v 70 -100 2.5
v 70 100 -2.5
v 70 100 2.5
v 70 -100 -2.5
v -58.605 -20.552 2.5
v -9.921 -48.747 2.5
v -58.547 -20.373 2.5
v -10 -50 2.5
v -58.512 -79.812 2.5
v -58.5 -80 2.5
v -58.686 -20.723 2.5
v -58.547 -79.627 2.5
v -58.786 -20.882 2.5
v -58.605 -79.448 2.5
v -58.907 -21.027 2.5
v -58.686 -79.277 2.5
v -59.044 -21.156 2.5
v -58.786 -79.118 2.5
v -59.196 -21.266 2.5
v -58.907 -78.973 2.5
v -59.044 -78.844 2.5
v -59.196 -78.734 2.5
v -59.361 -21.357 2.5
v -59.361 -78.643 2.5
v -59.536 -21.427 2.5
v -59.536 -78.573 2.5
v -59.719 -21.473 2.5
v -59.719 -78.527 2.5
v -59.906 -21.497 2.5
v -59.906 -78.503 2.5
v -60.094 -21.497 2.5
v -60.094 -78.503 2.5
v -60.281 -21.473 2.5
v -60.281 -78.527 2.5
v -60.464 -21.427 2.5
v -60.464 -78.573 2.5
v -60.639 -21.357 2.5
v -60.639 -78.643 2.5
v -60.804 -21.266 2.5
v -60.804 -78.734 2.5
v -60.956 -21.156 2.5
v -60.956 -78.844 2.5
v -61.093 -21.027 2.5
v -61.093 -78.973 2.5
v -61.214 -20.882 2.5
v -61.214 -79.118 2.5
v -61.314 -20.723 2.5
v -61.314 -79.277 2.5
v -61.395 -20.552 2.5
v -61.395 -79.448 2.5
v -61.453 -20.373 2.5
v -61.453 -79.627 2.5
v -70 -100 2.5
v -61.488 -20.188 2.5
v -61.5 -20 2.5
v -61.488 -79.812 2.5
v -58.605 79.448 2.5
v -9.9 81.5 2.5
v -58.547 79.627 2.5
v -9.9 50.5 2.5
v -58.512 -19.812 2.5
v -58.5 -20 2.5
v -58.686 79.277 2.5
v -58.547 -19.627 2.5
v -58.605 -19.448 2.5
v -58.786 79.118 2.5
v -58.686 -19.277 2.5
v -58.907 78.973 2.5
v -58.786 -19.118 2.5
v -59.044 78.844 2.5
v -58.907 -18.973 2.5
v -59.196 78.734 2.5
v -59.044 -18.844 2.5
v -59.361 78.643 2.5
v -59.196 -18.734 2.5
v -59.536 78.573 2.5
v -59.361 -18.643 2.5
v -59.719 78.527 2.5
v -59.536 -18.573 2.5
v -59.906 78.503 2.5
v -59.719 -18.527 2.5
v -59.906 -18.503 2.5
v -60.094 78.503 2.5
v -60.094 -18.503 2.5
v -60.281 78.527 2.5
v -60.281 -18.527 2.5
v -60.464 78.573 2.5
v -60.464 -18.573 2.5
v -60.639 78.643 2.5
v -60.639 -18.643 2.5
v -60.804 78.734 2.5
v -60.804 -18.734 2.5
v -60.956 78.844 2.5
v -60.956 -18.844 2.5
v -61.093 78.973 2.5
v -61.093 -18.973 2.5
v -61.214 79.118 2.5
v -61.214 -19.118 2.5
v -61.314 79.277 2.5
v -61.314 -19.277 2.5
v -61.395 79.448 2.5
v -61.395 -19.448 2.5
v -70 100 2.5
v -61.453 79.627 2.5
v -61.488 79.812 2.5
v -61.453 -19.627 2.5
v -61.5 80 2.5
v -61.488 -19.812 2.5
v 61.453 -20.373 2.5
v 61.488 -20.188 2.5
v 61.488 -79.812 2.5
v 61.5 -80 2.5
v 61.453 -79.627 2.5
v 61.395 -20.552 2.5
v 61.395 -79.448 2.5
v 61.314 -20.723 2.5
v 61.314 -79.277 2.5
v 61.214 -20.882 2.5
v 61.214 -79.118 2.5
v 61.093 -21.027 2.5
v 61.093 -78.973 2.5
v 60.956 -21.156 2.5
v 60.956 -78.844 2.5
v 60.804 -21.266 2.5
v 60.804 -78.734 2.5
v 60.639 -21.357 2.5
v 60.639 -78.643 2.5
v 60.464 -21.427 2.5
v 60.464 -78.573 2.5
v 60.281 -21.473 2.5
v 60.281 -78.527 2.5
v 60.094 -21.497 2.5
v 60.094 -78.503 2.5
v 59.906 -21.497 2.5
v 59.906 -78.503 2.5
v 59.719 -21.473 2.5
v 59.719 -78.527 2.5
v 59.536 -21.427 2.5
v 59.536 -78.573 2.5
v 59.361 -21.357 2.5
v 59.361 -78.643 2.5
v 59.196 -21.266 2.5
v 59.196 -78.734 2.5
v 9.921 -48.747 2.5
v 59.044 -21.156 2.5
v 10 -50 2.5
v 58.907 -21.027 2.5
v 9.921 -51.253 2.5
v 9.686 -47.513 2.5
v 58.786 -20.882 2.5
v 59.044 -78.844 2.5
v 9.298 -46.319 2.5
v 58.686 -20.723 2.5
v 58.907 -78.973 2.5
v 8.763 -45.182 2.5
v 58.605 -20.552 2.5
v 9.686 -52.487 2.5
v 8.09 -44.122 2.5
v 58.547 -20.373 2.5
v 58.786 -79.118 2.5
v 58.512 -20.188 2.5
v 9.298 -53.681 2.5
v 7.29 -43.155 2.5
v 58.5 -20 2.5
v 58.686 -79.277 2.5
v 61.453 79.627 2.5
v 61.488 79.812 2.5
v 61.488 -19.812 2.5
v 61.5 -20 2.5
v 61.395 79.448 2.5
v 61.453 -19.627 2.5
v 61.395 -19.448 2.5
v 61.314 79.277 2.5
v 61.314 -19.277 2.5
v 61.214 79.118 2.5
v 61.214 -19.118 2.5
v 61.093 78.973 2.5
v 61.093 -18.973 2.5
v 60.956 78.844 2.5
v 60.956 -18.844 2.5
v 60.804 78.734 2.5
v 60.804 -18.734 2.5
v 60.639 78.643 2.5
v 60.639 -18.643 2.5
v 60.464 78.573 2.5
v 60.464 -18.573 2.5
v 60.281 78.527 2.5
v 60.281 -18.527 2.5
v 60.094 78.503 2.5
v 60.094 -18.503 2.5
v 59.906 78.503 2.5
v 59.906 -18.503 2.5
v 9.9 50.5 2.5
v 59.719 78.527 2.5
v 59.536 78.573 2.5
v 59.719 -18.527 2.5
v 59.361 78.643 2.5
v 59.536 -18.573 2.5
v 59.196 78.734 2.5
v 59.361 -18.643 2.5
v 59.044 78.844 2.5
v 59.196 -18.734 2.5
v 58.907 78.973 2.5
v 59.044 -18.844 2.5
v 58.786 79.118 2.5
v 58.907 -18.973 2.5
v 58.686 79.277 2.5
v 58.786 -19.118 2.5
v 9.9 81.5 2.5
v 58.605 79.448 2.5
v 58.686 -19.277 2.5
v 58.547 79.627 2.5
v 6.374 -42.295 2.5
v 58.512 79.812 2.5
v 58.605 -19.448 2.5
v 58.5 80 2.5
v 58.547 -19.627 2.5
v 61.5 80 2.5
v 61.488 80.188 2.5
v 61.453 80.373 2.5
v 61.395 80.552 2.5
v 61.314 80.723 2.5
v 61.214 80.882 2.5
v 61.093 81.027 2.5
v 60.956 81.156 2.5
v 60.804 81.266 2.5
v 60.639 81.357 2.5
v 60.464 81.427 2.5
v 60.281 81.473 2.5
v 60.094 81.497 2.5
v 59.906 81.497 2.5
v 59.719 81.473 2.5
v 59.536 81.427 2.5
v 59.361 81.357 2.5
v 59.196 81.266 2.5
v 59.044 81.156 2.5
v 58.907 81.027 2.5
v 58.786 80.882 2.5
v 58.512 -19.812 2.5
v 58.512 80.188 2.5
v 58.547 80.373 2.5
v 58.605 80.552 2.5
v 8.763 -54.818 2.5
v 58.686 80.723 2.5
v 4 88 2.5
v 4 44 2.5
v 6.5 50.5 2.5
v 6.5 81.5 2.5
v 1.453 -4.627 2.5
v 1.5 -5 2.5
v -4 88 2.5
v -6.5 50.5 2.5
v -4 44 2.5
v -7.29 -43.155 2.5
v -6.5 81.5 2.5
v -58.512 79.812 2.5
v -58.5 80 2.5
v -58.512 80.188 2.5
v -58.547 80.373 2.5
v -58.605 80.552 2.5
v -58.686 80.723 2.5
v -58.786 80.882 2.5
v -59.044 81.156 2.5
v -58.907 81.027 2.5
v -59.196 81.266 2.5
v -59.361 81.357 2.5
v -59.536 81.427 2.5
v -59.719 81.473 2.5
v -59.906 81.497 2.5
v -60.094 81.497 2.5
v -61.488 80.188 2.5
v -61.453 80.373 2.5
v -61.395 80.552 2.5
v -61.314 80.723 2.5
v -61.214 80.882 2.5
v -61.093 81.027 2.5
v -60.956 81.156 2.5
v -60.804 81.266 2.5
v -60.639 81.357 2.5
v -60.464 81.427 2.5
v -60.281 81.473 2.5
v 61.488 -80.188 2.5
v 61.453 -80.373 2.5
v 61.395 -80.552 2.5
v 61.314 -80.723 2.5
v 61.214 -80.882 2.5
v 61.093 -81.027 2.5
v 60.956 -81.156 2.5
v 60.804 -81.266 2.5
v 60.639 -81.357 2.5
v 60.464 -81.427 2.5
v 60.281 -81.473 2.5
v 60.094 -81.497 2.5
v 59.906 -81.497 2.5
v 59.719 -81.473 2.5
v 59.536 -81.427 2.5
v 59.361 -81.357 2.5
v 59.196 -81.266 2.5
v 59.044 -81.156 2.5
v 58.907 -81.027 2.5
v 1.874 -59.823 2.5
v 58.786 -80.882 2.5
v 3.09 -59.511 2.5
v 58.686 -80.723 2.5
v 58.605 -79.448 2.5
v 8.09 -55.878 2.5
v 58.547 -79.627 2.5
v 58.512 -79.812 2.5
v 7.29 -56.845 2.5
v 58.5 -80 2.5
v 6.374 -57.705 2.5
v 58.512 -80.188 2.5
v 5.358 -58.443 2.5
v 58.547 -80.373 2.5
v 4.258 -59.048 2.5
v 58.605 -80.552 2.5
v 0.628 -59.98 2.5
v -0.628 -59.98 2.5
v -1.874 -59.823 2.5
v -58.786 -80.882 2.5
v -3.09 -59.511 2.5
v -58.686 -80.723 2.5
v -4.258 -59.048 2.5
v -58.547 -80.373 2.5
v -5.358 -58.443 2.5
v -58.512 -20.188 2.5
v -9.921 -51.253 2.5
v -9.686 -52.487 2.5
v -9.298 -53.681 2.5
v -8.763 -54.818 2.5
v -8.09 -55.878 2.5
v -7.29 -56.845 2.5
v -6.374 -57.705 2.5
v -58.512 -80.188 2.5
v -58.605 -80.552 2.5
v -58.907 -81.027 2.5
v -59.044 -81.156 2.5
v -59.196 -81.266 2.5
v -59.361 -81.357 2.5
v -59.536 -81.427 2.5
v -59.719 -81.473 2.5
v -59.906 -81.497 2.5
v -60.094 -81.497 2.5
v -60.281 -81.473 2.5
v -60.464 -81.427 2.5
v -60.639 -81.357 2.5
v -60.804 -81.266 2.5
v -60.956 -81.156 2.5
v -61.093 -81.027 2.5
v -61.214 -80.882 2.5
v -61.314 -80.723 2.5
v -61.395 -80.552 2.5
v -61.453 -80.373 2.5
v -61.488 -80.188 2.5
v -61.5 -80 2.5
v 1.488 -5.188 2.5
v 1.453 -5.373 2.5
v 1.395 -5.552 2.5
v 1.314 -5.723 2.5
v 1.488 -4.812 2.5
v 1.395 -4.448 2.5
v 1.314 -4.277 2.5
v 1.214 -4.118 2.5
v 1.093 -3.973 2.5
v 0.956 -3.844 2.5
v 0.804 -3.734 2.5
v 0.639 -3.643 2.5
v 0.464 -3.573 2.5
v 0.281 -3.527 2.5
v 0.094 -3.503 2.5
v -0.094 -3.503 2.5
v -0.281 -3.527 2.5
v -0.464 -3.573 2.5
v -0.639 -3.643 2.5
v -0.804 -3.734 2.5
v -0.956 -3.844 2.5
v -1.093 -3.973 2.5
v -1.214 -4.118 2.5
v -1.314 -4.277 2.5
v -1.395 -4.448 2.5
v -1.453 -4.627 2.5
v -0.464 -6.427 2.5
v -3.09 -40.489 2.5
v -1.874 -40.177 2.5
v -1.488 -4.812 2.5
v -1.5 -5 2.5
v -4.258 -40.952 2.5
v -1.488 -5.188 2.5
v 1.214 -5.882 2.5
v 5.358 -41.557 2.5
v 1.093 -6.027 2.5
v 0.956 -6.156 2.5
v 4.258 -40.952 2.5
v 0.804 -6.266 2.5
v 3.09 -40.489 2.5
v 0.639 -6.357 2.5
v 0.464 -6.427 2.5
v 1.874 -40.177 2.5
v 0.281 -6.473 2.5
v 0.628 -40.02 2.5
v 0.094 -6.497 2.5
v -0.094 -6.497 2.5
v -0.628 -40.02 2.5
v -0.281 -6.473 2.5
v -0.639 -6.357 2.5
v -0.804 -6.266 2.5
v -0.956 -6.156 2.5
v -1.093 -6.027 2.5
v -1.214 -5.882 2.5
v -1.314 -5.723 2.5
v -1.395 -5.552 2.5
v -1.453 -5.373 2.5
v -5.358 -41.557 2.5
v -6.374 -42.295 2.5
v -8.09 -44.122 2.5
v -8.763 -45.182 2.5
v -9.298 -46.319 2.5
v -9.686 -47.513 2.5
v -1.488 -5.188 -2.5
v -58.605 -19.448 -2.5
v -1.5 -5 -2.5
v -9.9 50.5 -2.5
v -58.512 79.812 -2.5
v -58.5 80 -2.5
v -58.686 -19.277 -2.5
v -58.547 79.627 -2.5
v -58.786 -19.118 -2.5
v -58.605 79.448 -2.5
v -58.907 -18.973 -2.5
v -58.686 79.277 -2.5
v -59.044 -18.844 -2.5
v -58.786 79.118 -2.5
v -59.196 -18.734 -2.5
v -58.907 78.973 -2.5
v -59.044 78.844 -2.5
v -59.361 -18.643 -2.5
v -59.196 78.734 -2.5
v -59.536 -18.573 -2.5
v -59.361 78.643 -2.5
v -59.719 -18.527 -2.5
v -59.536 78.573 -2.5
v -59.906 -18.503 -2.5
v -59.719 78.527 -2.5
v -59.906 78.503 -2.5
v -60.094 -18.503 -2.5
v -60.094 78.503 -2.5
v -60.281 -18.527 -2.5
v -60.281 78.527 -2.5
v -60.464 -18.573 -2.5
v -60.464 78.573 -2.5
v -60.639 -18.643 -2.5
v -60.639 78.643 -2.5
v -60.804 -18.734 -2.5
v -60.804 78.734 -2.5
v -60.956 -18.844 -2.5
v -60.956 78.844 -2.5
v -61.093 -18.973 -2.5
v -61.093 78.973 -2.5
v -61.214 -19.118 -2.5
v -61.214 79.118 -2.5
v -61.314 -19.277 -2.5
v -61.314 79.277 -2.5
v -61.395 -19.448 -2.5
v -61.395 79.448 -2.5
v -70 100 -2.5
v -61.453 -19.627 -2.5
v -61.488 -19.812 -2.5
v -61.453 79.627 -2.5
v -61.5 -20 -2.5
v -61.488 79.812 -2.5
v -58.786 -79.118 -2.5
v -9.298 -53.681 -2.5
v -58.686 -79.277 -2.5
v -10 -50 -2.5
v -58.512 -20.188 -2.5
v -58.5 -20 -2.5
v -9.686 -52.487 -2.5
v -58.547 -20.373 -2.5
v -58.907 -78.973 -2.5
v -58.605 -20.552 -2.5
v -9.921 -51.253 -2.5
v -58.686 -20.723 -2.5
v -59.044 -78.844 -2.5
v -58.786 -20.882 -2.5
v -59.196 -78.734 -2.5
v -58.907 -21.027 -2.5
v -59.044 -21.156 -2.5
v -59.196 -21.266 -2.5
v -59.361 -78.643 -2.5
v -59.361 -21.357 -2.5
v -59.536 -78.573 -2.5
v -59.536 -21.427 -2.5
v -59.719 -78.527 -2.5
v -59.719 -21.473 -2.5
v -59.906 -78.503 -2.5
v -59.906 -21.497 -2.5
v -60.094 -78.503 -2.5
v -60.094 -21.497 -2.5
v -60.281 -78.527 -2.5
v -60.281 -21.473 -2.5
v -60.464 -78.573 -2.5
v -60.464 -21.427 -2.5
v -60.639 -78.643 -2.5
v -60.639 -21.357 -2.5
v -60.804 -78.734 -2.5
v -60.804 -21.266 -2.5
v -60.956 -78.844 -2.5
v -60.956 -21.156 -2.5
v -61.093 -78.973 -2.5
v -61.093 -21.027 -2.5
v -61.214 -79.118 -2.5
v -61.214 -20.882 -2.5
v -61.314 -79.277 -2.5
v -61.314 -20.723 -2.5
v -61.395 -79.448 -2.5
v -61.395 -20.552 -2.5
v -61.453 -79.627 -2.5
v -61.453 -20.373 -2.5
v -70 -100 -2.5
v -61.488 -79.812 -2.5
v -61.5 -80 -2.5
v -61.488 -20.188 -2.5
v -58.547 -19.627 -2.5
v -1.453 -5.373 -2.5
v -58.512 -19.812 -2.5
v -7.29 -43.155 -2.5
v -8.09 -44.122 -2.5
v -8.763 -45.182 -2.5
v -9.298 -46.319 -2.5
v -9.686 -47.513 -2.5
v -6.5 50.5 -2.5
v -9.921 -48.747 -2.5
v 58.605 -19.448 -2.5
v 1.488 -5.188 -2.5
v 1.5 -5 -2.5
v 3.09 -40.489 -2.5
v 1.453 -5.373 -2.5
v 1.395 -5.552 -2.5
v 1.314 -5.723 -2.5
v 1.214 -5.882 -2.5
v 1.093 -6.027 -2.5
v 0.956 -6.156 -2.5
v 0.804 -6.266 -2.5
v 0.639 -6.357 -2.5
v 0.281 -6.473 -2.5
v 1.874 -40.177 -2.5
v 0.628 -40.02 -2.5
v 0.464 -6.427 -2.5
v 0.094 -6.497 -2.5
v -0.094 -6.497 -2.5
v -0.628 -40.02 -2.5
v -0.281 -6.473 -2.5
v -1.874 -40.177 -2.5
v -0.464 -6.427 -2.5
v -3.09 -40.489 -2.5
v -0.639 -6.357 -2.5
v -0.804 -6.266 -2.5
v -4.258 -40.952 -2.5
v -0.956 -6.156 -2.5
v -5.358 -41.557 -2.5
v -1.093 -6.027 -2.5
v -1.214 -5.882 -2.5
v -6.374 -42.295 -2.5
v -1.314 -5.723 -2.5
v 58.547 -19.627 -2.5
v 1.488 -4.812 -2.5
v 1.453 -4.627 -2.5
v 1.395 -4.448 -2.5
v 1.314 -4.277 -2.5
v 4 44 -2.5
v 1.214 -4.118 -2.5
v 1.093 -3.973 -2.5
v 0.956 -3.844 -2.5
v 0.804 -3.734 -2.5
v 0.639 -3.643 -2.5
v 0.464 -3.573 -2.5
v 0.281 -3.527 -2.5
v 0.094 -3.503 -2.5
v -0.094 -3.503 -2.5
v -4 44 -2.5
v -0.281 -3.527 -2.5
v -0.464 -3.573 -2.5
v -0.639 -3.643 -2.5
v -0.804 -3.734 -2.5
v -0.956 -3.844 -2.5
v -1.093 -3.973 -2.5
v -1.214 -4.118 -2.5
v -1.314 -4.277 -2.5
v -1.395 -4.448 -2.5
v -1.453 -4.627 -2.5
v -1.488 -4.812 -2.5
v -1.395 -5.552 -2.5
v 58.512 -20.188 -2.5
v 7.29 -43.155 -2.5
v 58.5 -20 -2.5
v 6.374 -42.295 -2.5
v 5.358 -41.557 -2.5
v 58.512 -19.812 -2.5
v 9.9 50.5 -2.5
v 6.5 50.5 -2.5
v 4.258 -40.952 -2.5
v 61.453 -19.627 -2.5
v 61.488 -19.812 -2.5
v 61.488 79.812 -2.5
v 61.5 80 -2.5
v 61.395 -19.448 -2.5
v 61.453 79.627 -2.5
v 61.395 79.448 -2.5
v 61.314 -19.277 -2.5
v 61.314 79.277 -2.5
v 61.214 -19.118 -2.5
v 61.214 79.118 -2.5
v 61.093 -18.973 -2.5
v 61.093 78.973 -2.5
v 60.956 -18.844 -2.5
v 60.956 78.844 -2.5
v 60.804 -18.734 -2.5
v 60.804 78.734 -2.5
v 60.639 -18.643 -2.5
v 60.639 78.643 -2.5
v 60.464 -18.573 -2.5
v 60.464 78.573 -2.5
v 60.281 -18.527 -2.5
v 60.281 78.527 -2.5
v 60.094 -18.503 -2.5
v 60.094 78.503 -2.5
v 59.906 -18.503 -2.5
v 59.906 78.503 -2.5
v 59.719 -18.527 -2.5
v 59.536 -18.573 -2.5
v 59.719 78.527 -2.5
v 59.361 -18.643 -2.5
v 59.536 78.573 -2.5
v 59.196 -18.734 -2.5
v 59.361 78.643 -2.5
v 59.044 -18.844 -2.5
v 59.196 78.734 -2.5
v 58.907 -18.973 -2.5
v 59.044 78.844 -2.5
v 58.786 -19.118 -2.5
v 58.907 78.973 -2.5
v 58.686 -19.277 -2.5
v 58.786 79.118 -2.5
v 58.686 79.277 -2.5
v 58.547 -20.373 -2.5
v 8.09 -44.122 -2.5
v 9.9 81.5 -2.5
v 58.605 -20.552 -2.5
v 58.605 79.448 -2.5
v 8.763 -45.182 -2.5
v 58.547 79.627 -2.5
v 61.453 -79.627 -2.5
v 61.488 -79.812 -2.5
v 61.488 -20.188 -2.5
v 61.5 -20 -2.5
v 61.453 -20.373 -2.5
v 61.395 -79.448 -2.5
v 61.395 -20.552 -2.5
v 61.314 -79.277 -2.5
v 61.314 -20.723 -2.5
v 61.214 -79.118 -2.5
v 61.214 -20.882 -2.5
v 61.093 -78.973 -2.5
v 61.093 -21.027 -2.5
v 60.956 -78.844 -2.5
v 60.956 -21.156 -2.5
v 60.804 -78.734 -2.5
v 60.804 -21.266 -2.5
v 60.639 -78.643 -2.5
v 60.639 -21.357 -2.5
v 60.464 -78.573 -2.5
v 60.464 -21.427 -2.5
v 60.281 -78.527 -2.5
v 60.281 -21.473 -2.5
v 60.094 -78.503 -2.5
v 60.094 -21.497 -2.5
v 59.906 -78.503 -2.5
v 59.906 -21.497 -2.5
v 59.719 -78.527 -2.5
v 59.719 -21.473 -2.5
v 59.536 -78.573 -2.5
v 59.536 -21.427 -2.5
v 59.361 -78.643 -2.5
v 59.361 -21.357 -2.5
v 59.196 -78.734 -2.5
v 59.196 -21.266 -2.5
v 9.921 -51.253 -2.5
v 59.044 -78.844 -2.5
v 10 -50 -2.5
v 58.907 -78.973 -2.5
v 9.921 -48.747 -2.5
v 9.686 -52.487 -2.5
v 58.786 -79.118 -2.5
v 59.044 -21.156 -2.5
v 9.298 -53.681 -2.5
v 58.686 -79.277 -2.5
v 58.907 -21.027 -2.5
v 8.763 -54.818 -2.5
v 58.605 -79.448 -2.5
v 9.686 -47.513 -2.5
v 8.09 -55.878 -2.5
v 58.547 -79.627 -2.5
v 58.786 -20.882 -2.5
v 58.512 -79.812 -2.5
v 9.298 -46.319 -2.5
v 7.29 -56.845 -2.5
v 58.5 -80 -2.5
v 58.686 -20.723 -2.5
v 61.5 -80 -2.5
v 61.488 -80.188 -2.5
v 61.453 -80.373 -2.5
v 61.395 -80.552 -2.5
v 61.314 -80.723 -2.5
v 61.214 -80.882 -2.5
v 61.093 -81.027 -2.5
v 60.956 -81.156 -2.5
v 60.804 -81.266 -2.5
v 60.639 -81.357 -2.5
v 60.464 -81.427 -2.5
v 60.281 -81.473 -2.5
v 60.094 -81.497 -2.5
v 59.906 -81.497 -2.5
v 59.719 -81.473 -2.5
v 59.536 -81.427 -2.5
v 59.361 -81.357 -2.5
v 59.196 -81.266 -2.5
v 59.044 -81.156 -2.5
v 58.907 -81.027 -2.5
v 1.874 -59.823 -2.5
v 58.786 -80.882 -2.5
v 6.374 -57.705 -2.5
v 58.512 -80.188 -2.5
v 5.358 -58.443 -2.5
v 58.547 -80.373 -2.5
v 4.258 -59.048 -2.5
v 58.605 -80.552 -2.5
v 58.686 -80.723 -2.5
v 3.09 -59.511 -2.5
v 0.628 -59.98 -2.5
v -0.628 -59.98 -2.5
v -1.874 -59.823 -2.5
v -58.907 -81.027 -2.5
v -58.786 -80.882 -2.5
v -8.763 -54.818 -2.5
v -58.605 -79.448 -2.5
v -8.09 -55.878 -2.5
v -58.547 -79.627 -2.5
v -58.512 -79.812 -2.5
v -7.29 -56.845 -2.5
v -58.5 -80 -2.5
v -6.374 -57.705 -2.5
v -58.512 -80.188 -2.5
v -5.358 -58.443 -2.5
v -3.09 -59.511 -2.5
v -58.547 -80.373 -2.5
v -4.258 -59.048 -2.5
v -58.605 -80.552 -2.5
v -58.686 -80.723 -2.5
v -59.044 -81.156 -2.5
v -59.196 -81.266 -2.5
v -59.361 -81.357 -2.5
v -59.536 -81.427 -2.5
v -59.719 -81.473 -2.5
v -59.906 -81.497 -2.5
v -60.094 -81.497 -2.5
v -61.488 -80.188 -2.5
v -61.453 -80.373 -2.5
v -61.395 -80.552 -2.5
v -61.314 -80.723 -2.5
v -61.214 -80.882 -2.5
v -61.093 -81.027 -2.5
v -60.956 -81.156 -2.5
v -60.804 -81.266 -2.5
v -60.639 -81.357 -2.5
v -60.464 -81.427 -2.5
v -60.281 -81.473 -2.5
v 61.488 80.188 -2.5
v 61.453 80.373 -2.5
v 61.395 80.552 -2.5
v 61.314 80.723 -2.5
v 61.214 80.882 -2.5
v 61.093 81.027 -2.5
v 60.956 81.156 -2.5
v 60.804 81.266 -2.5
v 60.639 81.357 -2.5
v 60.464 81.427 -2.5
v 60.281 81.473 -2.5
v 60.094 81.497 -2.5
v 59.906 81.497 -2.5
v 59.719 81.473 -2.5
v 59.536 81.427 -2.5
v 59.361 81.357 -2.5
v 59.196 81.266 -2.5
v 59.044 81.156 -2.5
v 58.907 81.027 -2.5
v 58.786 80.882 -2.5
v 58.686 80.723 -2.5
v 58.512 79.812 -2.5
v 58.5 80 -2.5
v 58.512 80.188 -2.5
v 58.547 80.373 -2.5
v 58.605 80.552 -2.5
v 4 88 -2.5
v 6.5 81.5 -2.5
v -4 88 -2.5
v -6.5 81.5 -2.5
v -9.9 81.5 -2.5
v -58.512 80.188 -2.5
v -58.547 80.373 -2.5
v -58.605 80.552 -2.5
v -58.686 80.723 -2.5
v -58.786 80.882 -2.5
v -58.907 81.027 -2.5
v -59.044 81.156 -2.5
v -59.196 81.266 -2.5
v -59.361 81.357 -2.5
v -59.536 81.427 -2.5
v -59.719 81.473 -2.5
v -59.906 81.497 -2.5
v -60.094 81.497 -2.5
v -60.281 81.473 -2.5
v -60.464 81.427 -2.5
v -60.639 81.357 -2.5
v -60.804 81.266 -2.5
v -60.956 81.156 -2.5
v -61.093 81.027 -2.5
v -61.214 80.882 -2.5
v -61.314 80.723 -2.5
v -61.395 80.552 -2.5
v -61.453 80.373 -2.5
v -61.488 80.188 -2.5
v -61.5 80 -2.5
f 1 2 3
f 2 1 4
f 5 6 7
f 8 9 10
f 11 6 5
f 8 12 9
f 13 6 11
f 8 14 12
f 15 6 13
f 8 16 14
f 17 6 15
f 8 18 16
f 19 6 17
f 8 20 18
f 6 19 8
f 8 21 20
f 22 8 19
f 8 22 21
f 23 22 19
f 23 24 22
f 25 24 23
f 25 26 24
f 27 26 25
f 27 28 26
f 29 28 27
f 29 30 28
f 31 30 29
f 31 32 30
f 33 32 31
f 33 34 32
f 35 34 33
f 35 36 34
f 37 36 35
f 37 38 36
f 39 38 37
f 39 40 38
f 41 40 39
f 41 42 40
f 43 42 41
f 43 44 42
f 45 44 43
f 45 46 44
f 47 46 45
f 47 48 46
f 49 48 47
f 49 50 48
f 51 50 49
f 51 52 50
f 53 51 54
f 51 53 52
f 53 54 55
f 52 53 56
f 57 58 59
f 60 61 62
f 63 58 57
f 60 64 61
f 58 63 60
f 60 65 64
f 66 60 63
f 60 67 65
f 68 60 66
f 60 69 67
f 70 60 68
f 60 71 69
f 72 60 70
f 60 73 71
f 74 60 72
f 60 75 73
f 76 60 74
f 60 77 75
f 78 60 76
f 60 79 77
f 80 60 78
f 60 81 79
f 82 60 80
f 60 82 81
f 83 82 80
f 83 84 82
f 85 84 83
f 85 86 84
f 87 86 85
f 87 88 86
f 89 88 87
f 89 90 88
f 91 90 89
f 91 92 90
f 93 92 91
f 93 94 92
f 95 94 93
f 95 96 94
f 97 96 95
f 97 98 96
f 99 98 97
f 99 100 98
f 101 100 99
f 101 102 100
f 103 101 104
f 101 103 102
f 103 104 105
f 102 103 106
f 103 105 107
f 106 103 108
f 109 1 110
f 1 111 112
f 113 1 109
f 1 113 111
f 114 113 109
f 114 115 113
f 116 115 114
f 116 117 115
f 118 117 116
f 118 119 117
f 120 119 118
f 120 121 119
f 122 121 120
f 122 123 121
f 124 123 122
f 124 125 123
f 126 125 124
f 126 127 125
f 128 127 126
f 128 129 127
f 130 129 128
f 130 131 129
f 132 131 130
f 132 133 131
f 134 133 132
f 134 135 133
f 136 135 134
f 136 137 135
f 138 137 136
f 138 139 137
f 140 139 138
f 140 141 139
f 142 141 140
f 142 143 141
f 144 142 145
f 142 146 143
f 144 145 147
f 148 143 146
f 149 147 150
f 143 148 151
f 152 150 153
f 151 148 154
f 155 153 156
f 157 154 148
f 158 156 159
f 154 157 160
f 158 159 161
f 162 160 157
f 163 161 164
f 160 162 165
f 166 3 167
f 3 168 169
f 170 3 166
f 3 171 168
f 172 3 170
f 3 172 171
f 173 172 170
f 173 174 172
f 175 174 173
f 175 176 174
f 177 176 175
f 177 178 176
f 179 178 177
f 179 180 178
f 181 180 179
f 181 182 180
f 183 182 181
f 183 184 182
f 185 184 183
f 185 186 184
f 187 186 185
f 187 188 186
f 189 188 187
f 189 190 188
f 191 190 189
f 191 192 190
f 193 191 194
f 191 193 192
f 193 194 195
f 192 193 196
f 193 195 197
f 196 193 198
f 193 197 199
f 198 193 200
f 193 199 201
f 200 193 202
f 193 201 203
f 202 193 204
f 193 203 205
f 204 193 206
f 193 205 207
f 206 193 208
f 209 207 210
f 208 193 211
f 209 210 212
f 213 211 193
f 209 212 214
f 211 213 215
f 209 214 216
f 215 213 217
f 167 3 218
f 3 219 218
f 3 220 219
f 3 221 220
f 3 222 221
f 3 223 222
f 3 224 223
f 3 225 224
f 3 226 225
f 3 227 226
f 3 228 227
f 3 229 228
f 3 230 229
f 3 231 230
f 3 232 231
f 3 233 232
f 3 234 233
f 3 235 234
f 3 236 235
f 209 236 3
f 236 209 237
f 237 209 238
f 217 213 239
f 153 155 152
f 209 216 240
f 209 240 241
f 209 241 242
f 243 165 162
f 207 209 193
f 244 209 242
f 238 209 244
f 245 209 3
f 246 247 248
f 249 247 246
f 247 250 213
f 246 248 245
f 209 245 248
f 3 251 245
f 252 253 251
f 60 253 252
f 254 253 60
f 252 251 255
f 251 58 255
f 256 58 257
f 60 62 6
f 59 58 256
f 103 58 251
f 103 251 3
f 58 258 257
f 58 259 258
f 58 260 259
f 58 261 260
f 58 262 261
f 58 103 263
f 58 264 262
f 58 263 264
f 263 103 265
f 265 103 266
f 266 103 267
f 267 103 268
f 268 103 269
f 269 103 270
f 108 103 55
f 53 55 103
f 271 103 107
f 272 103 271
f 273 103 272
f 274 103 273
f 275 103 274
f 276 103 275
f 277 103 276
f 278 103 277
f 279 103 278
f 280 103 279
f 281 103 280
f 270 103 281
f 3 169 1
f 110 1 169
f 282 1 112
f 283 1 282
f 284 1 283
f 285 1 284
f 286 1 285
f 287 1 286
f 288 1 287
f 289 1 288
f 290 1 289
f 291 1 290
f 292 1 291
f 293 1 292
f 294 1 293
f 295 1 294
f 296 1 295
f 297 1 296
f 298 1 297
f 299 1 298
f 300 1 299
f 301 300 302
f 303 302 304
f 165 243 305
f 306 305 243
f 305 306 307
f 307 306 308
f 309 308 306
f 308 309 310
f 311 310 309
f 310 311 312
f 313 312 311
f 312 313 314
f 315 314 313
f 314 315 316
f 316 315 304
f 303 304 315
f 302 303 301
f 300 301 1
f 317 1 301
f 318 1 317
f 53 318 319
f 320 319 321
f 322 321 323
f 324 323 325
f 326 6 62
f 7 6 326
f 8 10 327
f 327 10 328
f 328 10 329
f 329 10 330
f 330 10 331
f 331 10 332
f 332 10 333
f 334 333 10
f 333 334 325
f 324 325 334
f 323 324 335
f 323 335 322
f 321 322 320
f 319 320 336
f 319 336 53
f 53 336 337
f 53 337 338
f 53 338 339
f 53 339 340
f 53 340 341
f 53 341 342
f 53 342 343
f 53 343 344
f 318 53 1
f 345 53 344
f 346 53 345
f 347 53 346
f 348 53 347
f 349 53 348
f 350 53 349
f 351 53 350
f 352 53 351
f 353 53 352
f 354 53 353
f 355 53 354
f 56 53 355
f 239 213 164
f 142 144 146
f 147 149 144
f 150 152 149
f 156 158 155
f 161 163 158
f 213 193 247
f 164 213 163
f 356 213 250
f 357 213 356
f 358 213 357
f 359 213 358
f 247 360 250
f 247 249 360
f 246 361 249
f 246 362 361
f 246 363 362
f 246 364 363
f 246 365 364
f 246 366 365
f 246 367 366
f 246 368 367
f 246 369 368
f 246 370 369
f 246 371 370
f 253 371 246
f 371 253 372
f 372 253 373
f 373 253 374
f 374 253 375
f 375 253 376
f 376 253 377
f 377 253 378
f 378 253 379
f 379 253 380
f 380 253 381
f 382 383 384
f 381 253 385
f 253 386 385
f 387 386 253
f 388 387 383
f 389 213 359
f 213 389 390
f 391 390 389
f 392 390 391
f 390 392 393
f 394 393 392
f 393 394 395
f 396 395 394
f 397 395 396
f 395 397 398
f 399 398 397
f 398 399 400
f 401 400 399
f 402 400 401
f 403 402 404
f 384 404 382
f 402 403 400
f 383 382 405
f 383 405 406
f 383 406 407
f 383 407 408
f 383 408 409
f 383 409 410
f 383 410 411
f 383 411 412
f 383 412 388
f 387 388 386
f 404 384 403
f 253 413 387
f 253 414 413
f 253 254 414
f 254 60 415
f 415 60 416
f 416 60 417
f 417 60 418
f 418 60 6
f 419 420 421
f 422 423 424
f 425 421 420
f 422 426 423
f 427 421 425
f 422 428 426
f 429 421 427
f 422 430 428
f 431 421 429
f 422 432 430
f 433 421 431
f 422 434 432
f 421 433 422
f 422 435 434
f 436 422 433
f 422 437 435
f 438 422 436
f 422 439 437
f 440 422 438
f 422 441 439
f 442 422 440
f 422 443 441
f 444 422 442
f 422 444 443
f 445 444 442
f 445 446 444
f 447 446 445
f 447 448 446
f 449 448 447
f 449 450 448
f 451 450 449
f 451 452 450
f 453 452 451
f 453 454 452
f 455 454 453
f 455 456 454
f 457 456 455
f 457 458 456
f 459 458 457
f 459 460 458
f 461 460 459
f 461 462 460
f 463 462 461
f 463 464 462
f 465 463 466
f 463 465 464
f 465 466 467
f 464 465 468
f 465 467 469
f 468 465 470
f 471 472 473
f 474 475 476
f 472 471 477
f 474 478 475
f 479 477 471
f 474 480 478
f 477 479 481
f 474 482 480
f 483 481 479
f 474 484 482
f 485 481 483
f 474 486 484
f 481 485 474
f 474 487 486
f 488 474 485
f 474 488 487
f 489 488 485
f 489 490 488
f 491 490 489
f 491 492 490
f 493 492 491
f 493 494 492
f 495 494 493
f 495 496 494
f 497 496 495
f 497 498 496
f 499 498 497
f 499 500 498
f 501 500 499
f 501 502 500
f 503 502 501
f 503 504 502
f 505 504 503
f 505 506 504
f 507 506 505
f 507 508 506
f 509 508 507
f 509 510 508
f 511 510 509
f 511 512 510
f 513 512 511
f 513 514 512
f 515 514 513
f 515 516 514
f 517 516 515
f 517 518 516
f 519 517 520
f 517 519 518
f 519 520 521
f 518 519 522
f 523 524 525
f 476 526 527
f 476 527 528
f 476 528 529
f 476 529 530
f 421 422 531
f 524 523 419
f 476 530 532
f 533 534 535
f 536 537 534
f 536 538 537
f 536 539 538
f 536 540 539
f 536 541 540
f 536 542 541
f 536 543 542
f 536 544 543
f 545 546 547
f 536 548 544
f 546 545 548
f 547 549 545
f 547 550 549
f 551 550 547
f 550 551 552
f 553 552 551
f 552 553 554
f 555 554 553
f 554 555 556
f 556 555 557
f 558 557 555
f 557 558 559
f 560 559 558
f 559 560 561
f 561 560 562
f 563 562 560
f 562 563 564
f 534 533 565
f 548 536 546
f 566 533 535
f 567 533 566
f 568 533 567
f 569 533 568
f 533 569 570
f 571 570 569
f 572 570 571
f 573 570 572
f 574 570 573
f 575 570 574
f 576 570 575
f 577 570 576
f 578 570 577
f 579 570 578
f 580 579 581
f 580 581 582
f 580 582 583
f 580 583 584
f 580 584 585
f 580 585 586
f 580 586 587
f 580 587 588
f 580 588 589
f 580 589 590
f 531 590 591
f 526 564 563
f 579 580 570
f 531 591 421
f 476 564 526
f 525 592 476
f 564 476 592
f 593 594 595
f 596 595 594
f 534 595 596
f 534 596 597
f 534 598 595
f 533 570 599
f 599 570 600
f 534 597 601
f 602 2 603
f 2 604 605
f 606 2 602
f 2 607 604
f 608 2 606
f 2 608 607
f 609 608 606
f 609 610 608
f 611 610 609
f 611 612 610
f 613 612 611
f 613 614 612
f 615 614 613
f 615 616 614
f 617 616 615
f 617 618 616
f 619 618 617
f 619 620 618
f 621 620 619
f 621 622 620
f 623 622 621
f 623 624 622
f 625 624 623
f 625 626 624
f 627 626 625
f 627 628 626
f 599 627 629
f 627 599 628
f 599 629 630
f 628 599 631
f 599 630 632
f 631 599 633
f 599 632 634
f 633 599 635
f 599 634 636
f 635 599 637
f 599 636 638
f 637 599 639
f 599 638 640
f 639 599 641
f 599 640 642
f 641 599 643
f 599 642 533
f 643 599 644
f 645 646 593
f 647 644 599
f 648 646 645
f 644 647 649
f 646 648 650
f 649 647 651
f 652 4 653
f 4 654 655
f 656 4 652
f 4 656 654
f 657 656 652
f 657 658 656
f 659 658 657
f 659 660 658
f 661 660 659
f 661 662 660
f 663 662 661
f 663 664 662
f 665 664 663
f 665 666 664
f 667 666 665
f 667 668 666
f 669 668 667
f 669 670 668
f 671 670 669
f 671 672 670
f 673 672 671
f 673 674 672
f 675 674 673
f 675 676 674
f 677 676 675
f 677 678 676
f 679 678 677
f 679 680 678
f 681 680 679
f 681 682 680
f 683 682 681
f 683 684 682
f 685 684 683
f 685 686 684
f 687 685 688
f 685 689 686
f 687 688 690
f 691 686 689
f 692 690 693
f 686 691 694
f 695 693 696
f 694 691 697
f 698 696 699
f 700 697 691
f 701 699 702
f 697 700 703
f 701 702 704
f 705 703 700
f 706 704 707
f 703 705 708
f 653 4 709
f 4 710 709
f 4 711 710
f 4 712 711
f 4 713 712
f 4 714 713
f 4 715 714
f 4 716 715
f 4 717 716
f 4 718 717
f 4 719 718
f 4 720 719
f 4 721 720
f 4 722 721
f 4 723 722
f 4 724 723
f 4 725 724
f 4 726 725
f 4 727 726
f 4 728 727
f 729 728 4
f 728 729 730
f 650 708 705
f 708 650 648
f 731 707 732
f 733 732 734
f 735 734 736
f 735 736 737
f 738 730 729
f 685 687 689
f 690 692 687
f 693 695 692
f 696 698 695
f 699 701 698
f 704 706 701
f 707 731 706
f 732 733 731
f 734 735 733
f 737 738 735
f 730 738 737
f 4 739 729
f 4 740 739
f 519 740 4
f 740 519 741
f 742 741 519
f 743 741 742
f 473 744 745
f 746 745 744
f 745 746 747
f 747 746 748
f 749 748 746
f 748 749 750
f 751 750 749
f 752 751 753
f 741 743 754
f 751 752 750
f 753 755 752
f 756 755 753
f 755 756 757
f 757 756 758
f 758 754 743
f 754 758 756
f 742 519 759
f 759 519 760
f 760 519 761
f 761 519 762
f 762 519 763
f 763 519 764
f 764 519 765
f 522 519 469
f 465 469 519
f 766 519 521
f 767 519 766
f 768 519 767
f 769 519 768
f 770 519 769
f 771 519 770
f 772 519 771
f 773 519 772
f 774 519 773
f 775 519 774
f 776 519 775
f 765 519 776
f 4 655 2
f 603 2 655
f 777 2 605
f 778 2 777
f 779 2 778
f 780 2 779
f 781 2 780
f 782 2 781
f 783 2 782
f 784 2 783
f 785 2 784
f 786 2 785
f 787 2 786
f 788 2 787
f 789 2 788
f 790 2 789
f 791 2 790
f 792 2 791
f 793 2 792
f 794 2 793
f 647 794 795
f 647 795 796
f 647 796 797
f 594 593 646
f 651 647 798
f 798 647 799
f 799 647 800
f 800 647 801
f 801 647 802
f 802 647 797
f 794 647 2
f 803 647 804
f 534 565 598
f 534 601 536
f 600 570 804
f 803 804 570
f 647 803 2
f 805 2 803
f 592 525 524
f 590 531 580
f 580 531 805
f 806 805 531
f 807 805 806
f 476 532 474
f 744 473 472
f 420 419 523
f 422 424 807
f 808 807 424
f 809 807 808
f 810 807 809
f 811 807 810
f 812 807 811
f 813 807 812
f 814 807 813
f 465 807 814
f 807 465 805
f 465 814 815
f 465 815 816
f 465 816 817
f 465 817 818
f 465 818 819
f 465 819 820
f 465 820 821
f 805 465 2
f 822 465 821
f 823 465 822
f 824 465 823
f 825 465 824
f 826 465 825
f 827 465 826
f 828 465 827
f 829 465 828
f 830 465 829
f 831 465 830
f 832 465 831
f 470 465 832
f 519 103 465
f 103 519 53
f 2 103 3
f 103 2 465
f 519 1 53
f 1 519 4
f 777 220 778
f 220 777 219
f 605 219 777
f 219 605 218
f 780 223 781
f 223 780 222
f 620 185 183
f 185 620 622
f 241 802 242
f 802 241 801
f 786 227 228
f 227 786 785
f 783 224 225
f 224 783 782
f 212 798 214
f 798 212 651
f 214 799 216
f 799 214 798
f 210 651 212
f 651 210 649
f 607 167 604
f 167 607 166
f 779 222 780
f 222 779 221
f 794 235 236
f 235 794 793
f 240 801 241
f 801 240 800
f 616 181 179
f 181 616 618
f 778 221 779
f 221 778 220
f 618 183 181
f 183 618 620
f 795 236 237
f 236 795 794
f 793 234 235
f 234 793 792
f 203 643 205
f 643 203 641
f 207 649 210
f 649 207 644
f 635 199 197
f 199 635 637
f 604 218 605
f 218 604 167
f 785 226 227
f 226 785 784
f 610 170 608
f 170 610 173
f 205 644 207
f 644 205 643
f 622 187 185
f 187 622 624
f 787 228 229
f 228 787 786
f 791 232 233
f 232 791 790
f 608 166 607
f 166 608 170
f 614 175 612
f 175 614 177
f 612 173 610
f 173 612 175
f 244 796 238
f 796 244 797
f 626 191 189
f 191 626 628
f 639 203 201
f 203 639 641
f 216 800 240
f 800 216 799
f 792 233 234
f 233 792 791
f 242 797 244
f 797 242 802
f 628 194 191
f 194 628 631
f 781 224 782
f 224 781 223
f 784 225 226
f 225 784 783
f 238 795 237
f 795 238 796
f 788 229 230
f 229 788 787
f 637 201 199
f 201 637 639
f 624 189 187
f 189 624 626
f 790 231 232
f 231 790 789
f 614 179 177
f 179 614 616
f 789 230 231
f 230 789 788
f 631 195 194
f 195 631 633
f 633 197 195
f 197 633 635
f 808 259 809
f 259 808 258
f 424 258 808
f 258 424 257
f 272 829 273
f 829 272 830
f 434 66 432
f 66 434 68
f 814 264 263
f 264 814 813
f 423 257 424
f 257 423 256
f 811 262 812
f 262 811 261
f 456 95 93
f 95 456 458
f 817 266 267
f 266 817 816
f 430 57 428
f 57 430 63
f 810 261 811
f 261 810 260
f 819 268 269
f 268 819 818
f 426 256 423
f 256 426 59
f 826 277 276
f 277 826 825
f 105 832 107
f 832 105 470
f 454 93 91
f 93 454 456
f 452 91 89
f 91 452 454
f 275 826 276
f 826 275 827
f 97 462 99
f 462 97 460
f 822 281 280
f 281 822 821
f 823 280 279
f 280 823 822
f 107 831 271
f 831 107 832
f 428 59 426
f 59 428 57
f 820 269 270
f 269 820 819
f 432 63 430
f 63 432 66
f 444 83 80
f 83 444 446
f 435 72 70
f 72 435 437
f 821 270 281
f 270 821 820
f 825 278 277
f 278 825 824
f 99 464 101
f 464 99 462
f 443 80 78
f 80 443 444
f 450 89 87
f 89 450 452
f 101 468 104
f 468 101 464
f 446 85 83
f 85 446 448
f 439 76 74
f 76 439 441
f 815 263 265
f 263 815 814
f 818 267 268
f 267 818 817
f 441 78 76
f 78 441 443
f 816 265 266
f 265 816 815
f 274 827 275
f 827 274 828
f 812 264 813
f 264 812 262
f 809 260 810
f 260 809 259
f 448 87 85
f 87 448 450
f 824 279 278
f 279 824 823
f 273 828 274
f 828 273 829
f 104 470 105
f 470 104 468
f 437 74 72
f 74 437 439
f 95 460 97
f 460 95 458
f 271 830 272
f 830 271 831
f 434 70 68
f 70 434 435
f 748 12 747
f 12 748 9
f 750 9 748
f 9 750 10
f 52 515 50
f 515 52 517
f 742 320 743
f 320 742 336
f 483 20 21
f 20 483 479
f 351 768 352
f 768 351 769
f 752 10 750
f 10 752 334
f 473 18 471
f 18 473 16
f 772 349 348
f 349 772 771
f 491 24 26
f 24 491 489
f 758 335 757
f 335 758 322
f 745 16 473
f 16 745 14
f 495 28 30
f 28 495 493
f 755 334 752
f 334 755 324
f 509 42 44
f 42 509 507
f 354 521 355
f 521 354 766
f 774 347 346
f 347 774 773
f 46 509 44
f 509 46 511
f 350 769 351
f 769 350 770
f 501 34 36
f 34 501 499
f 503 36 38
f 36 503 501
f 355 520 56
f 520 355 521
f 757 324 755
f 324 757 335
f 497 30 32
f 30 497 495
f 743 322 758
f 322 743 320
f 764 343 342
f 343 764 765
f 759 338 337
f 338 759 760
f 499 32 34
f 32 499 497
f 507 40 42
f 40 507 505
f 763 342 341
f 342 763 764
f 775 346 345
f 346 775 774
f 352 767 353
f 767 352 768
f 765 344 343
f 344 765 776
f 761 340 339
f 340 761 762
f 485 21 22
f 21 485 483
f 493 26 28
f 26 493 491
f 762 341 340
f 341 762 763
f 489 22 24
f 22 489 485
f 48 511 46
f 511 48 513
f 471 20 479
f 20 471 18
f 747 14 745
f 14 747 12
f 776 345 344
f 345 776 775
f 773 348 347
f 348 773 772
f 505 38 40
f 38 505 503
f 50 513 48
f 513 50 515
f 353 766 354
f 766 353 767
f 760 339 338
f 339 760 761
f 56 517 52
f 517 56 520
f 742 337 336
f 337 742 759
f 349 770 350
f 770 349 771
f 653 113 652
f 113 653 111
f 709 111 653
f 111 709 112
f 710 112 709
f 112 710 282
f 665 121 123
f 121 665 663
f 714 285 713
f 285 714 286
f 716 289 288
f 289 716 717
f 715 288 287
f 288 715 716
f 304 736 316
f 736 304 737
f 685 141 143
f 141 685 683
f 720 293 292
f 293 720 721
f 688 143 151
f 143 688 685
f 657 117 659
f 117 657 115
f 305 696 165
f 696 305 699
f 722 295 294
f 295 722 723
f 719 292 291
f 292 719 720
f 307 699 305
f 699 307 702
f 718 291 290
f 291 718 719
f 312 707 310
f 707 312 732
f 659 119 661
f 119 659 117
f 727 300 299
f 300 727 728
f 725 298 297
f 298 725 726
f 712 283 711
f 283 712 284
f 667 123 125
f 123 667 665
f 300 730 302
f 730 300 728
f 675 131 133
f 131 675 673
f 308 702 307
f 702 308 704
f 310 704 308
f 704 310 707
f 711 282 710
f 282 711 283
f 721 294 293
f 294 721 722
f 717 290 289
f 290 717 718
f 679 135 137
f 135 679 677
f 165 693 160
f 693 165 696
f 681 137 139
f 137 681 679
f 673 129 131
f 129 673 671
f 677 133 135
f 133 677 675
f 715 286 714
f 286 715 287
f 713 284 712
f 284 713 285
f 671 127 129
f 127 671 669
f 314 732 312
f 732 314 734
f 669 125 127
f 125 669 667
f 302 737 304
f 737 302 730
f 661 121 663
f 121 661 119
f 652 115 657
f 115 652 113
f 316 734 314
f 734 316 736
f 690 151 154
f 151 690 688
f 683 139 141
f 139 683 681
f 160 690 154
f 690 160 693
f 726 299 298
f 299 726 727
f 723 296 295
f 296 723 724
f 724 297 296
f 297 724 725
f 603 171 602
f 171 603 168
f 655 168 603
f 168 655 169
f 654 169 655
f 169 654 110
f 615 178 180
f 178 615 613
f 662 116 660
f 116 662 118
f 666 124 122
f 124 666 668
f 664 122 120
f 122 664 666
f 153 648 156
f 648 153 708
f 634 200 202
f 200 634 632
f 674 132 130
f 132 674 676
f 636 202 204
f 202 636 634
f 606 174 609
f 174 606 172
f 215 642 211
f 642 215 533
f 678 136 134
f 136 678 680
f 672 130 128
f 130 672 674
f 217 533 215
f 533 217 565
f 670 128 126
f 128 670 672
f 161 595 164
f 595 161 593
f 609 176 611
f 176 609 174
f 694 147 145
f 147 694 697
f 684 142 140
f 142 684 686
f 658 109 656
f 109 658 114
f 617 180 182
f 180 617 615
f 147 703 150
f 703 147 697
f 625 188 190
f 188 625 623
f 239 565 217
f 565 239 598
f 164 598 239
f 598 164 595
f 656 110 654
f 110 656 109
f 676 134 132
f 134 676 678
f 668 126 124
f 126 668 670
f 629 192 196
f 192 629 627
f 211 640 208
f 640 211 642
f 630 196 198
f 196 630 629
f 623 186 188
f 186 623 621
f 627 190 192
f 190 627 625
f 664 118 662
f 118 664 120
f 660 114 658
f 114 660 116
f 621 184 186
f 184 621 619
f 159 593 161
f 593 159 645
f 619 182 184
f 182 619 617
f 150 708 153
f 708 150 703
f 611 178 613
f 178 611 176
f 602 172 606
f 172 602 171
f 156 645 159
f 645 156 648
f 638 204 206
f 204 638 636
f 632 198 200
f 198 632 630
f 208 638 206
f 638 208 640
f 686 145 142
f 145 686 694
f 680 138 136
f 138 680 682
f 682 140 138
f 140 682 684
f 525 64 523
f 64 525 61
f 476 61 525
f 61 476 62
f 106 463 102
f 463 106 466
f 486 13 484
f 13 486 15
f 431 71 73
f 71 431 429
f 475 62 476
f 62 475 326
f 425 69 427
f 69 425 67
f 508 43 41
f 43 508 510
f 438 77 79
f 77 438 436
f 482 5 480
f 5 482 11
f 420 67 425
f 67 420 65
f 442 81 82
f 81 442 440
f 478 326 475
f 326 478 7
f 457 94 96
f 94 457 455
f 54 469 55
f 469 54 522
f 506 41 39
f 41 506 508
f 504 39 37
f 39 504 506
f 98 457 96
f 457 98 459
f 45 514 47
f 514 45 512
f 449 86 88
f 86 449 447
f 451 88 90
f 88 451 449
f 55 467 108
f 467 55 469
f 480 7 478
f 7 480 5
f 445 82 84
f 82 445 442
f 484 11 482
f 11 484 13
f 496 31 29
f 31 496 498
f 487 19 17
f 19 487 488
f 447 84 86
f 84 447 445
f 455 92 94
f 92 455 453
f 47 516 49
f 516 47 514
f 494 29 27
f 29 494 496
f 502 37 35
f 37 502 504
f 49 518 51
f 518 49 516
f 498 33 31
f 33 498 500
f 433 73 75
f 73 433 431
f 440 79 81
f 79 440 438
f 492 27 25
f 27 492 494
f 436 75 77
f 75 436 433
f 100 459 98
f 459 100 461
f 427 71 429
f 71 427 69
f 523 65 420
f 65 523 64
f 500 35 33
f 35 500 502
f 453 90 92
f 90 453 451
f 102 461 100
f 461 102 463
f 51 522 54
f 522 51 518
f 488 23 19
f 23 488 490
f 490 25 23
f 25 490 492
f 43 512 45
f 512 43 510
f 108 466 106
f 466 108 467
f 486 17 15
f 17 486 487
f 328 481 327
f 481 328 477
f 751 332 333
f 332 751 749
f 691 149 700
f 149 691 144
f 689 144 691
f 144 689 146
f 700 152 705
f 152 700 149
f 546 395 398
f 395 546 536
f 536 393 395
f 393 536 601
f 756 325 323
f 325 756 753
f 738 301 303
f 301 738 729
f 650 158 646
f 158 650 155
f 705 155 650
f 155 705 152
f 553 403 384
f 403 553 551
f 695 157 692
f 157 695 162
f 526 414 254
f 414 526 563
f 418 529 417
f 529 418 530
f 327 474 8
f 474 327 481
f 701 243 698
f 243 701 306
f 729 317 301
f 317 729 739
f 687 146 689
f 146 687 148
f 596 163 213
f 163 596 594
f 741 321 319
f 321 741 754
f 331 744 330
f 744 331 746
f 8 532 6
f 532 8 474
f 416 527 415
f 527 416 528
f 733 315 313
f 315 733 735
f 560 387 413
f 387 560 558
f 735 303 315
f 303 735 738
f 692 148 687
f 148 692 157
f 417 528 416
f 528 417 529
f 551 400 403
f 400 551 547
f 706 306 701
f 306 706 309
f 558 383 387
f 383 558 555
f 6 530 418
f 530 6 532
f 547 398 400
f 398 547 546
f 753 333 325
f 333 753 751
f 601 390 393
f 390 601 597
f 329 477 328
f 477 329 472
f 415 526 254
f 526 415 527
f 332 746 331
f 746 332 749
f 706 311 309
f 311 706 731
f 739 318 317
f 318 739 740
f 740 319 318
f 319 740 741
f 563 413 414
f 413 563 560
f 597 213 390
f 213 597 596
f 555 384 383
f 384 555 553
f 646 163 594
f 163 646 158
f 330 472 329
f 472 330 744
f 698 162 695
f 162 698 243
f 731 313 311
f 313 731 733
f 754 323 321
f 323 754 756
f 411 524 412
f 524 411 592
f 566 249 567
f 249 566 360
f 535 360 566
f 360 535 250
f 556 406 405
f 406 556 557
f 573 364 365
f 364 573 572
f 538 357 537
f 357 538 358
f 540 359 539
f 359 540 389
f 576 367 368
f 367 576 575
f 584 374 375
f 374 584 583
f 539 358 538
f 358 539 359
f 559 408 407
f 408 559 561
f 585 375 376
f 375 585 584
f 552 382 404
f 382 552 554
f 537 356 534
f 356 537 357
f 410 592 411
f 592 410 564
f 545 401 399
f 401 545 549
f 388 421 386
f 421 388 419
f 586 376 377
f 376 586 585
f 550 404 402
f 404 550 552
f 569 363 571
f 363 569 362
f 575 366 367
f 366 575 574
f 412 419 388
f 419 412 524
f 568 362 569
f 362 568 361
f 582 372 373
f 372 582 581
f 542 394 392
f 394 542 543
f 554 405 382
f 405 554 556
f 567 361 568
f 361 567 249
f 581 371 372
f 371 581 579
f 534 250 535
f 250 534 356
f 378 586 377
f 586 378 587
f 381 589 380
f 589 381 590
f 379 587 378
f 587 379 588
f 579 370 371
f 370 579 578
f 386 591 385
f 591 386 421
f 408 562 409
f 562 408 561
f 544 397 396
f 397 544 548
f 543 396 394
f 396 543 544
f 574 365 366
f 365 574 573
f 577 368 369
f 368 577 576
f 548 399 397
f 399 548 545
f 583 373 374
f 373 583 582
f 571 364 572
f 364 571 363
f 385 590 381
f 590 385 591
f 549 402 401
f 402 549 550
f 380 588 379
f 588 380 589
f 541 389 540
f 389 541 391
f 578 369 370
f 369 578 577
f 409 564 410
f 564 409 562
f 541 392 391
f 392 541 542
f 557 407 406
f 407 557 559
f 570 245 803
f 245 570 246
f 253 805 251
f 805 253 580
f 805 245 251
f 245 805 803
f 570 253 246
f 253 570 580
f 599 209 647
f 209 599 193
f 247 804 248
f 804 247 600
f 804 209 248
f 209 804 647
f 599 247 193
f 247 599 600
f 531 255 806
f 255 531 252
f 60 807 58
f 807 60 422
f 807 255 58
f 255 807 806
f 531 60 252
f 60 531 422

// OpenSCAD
//Author: Piotr Paterek, Kraków 05-08.2016
$fn=50;
module base()
{
difference()
{    
    difference()
    {
        difference()
        {
            difference()
            {
                difference()
                {
                    difference()
                    {
                        difference()
                        {
                            difference()
                            {
                                difference()
                                {
                                    difference()
                                    {
                                        difference()
                                        {
                                        cube([140,200,5], center=true); 
                                        translate([60,80,0])
                                            {
                                                cylinder(r=1.5, h=10, center=true);
                                            }
                                        }
                                     translate([-60,80,0])
                                            {
                                                cylinder(r=1.5, h=10, center=true);
                                        }
                                    }
                               translate([-60,-80,0])
                                            {
                                                cylinder(r=1.5, h=10, center=true); 
                                            }
                               }
                           translate([60,-80,0])
                                        {
                                            cylinder(r=1.5, h=10, center=true);
                                        }
                                    }
                        translate([60,-20,0])
                            {
                                cylinder(r=1.5, h=10, center=true);
                            }
                        }
                    translate([-60,-20,0])
                        {
                            cylinder(r=1.5, h=10, center=true);
                        }
                    }
                 translate([0,-50,0])
                        {
                            cylinder(r=10, h=10, center=true);
                        }
                    }
            translate([0,-5,0])
                {
                    cylinder(r=1.5, h=10, center=true);
                }
            }
        translate([0,66,0])
            {
                cube([8,44,5], center=true);
            }
        }
    translate([8.2,66,0])
        {
            cube([3.4,31,5], center=true);
        }
    }
translate([-8.2,66,0])
    {
        cube([3.4,31,5], center=true);
    }
}
}
 
    
 base();
